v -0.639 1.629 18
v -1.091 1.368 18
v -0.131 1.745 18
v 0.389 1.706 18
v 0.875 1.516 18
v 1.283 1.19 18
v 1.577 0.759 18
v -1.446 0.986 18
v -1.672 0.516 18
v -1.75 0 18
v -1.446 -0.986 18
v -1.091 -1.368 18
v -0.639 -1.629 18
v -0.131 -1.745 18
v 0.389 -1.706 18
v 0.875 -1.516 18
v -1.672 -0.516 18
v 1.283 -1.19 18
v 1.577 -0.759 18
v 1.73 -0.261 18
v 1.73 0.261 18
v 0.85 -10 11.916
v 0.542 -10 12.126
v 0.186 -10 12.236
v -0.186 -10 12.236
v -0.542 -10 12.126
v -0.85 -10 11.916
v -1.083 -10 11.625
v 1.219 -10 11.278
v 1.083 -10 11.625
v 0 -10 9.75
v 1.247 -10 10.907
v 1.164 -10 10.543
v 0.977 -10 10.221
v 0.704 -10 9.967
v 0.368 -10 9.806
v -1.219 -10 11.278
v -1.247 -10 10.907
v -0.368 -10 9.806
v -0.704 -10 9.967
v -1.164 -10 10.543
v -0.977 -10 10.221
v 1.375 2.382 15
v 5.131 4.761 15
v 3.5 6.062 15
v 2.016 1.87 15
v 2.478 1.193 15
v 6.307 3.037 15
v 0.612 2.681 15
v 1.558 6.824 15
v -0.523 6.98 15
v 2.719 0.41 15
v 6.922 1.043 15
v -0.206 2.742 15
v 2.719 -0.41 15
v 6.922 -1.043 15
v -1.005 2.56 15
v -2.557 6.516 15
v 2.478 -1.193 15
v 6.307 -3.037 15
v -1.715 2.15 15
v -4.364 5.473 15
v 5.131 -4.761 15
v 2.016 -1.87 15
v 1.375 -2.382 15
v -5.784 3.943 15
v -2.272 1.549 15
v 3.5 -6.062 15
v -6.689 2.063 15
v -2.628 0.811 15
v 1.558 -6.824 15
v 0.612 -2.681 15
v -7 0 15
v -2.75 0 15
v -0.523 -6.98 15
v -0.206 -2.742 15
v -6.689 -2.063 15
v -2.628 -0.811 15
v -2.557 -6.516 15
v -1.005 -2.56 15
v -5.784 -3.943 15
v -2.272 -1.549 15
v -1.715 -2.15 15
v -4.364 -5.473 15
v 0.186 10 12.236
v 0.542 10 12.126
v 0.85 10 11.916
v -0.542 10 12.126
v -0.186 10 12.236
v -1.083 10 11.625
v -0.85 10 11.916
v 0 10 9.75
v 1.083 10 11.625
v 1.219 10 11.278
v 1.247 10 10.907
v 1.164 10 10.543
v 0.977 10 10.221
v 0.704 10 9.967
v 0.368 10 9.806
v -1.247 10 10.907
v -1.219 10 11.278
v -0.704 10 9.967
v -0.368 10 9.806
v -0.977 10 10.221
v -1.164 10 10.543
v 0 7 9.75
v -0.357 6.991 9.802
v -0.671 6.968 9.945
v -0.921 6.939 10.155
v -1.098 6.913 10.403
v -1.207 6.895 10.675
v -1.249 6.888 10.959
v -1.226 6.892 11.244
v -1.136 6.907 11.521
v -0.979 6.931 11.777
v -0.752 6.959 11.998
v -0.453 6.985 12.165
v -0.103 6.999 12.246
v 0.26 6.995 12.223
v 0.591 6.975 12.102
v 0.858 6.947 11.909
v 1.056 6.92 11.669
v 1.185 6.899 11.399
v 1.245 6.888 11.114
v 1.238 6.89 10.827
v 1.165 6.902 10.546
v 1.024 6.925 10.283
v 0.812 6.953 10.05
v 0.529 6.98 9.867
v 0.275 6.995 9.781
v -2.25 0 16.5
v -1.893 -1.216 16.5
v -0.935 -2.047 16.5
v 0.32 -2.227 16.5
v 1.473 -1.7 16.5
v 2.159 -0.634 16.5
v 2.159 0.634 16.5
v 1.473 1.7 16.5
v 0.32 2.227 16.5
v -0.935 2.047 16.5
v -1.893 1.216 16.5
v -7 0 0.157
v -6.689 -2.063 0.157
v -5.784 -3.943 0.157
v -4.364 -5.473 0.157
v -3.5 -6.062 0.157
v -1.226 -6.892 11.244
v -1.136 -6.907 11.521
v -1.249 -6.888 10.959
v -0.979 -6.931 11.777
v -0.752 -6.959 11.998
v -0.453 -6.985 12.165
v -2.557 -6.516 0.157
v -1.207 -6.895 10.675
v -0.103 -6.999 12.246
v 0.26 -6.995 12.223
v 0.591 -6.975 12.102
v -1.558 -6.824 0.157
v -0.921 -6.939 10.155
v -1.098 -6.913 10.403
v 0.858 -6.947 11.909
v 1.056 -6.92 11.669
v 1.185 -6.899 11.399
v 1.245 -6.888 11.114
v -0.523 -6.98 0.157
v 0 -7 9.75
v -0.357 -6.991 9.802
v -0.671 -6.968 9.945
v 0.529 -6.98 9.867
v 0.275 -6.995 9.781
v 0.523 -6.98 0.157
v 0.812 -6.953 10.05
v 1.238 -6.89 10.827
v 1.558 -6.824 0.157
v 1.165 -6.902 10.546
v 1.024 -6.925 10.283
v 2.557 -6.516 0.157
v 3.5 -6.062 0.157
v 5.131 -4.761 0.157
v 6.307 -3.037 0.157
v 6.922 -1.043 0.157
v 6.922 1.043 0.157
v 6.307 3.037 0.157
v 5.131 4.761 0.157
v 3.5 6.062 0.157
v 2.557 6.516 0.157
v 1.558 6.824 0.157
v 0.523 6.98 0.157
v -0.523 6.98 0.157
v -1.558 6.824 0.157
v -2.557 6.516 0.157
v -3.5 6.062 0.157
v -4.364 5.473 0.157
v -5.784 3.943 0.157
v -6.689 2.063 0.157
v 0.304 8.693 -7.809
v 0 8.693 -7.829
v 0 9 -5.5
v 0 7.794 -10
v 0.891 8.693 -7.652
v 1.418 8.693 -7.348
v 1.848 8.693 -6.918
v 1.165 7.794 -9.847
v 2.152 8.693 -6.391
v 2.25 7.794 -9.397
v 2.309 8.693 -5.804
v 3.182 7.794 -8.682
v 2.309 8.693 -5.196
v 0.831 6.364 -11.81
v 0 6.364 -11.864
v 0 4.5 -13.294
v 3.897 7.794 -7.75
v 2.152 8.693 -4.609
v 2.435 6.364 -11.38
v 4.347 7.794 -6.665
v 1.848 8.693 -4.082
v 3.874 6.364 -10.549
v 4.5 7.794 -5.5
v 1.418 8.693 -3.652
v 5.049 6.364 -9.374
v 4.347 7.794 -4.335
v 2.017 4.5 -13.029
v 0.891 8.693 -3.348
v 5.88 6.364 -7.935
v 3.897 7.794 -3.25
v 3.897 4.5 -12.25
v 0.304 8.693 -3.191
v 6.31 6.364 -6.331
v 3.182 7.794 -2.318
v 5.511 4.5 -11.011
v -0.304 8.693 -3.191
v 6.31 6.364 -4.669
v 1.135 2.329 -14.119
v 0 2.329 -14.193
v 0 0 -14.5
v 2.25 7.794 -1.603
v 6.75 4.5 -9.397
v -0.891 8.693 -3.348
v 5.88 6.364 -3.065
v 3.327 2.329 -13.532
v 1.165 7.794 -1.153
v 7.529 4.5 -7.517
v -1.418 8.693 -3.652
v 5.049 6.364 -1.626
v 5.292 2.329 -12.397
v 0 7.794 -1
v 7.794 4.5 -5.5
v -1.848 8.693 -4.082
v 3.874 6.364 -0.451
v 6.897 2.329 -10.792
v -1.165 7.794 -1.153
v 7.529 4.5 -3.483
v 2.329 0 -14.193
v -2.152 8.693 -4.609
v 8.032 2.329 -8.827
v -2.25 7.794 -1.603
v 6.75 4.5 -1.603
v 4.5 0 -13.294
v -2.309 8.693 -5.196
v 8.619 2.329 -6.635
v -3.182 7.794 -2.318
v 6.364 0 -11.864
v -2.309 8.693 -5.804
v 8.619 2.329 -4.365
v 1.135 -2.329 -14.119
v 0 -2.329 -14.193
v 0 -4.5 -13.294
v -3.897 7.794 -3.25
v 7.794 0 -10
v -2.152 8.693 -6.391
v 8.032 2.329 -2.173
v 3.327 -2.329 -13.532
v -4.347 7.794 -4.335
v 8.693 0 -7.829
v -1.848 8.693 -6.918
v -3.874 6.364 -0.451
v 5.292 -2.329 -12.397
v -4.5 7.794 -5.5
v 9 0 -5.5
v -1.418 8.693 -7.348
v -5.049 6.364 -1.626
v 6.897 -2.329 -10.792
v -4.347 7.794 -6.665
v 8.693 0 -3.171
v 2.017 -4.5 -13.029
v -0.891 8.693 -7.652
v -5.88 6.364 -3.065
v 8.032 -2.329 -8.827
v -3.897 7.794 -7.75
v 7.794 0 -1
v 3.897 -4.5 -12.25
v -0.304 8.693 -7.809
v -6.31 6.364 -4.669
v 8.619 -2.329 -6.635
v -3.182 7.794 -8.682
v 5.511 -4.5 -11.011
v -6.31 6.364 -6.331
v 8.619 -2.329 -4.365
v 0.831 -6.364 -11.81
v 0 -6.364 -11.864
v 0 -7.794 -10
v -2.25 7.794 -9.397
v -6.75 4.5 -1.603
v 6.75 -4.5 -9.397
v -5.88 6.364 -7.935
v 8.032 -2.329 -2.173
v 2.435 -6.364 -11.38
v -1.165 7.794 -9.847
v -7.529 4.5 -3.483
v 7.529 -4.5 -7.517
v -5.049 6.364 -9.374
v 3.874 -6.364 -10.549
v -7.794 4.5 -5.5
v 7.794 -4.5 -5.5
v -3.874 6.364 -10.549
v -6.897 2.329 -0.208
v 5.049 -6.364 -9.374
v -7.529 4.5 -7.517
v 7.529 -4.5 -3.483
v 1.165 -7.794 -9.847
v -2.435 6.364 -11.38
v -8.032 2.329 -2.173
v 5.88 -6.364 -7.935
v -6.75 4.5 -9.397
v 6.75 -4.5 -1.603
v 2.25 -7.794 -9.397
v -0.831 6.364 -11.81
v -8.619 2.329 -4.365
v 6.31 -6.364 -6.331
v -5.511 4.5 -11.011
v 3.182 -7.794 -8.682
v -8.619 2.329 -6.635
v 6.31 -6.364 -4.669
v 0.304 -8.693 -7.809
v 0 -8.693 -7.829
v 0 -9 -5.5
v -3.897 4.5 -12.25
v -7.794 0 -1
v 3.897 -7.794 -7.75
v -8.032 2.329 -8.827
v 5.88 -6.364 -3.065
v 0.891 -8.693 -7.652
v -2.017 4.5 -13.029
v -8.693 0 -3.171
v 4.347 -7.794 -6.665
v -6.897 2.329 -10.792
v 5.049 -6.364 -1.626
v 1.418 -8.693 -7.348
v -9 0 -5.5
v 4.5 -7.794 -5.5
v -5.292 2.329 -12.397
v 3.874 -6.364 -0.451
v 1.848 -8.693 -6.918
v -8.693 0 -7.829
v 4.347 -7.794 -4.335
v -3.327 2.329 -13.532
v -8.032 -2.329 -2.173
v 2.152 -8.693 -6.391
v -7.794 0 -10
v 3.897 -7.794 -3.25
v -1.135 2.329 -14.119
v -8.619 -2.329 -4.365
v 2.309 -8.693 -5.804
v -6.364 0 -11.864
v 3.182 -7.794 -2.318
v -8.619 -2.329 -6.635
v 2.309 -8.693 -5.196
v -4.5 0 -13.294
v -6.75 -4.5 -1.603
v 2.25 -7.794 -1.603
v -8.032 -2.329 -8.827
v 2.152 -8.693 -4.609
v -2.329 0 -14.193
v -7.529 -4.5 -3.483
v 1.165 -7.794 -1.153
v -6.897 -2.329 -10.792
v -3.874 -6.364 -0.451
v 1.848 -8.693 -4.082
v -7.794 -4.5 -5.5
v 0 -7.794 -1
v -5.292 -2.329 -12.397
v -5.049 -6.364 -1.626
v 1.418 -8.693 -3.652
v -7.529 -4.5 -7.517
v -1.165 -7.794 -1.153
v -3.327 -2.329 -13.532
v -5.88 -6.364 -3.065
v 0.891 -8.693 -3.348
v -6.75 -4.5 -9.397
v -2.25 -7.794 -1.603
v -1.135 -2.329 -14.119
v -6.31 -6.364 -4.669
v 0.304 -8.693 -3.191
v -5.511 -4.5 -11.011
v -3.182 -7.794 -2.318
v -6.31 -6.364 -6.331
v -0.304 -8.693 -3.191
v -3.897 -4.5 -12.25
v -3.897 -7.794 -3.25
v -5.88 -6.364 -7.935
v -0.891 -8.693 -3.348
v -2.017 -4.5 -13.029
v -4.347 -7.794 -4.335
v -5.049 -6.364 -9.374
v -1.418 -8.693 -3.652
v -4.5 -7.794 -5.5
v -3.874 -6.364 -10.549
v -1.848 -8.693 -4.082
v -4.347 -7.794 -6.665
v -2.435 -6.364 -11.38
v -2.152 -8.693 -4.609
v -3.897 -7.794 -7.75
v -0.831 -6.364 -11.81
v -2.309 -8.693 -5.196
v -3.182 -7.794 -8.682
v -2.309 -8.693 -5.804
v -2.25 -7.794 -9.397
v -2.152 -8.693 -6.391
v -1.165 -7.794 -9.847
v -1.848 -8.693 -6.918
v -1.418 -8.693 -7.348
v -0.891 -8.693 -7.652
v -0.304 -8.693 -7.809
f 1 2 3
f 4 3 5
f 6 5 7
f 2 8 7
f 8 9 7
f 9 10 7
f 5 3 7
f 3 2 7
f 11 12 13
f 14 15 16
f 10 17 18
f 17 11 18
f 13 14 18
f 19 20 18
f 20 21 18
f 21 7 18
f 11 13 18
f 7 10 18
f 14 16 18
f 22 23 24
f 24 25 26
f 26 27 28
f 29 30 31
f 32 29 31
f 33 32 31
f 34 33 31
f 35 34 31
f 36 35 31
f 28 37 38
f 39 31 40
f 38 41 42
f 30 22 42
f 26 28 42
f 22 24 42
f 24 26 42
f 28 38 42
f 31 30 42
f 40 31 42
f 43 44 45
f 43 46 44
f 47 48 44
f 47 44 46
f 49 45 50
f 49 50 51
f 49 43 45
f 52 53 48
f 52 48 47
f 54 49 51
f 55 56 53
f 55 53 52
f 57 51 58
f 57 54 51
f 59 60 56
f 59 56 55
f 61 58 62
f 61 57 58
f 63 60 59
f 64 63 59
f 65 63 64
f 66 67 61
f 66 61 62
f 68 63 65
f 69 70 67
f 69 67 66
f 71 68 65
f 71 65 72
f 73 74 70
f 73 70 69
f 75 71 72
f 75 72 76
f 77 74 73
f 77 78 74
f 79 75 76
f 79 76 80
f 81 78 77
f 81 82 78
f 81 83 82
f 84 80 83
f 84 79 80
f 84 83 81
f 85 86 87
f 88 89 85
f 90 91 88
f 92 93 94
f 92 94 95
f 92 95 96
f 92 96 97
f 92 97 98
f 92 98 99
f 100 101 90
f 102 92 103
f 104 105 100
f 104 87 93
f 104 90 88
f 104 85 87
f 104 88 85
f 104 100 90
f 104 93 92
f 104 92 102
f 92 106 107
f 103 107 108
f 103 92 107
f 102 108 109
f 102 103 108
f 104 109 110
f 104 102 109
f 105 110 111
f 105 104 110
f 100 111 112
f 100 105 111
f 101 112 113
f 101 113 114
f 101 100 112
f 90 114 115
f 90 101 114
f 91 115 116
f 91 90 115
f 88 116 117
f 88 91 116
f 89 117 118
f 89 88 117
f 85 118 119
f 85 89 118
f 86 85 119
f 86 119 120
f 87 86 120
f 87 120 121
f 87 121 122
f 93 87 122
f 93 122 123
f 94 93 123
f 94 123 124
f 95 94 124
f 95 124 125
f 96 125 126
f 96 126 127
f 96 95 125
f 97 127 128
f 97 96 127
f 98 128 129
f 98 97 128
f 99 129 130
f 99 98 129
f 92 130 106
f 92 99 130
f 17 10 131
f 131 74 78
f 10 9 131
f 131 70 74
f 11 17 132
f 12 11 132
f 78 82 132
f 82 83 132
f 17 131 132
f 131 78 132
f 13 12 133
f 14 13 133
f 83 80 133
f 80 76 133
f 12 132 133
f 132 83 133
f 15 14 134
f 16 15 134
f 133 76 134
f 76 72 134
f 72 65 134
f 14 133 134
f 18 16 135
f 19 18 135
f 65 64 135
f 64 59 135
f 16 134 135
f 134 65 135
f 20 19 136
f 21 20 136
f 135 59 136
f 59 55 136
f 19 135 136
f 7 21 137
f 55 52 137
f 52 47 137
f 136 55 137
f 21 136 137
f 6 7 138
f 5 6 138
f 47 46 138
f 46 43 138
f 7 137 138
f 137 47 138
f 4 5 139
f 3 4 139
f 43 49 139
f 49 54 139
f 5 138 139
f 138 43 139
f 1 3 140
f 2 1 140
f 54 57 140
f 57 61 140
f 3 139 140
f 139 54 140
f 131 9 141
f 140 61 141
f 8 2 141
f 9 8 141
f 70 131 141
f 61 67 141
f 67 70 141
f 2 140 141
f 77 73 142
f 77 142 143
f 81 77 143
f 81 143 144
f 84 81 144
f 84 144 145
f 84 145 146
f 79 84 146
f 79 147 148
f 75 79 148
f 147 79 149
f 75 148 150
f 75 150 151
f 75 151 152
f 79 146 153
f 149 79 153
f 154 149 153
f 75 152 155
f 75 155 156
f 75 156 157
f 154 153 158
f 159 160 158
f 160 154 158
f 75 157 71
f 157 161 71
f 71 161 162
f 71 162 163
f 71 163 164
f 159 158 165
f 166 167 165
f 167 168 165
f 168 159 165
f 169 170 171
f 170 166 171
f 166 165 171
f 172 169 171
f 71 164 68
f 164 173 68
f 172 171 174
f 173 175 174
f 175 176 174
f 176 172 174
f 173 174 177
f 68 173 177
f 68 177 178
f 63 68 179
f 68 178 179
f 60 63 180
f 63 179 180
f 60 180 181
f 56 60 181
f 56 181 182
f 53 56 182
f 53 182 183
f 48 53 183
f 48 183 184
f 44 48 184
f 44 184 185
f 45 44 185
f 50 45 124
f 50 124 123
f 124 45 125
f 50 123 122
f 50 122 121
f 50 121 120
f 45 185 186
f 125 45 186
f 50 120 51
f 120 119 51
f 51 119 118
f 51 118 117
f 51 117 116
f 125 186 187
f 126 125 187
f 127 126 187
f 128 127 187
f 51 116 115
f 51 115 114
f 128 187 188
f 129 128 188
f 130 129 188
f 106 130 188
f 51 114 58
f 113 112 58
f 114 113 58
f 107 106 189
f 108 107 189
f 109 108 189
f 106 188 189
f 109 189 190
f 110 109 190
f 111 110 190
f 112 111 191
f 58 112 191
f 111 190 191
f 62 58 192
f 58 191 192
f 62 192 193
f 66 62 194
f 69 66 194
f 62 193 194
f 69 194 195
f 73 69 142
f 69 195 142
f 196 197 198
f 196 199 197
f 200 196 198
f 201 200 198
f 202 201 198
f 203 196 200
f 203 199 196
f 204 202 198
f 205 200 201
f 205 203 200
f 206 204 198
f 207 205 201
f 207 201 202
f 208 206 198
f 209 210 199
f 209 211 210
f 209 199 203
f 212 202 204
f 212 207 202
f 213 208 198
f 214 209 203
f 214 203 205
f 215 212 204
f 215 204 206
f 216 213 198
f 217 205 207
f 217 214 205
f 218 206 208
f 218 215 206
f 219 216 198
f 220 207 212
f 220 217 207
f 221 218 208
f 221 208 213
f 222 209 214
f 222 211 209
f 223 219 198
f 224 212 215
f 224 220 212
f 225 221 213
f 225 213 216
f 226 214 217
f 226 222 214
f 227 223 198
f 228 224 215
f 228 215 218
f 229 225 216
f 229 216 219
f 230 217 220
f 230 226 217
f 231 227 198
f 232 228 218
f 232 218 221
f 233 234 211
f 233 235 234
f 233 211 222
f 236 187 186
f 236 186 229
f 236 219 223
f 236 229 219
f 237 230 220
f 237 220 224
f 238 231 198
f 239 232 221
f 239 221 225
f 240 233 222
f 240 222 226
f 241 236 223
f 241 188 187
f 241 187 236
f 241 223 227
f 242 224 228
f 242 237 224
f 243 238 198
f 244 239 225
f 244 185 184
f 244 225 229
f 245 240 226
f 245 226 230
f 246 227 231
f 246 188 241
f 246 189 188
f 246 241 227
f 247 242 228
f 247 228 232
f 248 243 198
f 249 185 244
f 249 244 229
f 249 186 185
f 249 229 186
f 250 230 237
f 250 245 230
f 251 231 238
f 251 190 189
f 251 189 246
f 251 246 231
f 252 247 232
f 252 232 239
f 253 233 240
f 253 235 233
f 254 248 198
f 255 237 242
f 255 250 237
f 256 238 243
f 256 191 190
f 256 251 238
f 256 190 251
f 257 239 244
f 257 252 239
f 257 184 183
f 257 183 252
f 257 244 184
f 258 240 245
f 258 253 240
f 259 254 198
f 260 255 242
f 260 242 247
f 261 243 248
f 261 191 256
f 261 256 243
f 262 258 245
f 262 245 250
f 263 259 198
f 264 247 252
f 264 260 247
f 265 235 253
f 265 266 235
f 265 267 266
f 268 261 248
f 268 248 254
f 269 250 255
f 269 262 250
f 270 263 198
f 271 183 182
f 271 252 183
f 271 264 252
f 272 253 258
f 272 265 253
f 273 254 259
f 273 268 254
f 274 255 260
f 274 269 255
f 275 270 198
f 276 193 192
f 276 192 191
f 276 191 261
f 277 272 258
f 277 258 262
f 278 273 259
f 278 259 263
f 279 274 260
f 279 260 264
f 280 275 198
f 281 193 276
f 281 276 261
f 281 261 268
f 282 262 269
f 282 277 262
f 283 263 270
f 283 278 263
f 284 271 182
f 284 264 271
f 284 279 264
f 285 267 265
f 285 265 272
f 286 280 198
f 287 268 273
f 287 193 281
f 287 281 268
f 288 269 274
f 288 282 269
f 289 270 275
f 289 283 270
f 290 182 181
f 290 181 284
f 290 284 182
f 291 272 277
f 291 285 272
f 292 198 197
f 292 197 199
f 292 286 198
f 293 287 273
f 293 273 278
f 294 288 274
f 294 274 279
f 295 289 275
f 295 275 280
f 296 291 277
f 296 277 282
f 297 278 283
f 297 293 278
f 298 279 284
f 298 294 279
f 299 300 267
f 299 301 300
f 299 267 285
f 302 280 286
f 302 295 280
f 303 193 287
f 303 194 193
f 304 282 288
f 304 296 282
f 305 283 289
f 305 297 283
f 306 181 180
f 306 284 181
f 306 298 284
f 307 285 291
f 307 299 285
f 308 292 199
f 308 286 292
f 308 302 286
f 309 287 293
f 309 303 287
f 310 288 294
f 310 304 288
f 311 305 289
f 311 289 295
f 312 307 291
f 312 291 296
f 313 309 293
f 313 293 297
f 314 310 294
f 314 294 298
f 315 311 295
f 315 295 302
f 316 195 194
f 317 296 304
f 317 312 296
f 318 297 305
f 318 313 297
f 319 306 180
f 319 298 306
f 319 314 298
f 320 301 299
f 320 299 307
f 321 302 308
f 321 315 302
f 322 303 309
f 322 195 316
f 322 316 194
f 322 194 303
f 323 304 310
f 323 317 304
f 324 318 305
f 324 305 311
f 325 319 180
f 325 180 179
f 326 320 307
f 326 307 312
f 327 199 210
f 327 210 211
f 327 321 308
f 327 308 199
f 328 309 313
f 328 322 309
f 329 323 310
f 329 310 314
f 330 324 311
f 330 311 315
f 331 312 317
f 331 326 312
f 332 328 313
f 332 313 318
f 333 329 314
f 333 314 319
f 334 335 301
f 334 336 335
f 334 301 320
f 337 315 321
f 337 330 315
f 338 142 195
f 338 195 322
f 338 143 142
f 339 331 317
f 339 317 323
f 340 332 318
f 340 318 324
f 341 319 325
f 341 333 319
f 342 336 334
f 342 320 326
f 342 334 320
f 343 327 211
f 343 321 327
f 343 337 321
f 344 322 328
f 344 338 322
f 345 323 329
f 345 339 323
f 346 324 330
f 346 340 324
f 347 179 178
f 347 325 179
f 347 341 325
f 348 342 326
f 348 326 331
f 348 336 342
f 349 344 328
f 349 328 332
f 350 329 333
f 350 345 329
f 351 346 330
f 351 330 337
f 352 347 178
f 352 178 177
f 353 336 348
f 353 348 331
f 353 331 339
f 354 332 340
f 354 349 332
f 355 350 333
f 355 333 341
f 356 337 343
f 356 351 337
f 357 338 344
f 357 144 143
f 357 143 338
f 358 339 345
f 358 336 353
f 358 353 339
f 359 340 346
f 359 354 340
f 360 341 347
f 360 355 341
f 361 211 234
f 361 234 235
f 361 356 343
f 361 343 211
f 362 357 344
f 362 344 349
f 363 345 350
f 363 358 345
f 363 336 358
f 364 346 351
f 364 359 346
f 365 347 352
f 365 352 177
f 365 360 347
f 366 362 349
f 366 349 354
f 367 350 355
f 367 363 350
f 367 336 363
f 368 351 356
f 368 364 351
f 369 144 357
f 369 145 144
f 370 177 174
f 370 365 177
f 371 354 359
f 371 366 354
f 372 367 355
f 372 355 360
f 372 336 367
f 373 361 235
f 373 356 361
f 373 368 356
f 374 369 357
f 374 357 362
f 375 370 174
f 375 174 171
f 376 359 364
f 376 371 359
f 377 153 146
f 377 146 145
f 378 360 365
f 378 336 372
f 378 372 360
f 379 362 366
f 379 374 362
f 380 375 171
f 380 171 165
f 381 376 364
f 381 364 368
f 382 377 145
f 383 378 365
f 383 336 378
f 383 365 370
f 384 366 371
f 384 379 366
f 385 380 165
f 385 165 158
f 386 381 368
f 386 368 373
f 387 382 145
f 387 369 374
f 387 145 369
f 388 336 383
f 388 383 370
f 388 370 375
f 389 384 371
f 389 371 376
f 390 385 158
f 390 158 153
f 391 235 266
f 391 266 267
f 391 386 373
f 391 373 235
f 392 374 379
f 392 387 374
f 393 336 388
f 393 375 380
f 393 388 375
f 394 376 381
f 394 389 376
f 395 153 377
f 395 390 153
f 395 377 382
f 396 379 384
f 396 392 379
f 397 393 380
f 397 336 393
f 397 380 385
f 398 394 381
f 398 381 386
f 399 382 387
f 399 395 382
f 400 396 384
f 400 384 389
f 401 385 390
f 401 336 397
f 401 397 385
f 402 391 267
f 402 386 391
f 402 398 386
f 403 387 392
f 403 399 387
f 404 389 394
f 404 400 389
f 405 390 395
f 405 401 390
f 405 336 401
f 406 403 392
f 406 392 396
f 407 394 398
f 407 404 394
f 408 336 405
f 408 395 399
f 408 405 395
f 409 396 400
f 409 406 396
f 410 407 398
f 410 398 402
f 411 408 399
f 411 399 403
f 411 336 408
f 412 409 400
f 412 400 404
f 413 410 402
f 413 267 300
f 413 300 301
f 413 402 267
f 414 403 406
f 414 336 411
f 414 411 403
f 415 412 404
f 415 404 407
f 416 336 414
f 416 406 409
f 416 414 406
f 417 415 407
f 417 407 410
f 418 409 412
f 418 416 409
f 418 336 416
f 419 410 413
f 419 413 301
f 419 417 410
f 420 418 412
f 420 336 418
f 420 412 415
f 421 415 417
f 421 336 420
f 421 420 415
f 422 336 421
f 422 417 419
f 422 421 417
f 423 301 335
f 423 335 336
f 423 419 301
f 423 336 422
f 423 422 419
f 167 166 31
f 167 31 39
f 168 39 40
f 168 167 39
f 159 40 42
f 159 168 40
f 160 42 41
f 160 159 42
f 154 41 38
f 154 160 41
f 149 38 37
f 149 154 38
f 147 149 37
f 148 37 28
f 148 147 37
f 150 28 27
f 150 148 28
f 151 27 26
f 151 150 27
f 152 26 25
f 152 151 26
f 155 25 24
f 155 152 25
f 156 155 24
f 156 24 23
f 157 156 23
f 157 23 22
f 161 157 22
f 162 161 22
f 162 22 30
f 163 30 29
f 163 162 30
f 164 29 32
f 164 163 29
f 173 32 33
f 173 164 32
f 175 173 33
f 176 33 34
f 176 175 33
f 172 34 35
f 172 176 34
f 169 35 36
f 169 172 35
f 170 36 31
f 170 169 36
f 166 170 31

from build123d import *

# Parameters (mm, degrees)
ESQUISSE1_R        = 7
CORPS_DEPTH        = 15
ESQUISSE4_R        = 1.25
BAILLONETTES_DEPTH = 10


with BuildPart() as part:
    # Esquisse1 → Corps (new body)
    with BuildSketch(Plane.XY):
        with Locations(Location((0, 0, 0), (0, 0, 180))):  # turned: the seam where the file's is
            Circle(ESQUISSE1_R)
    extrude(amount=CORPS_DEPTH)

    # Esquisse3 → Verre (revolve)
    with BuildSketch(Plane(origin=(0, 0, 0), x_dir=(0, 0, -1), z_dir=(1, 0, 0))):
        with BuildLine():
            Line((5.5, -9), (5.5, 9))
            ThreePointArc((5.5, 9), (14.5, 0), (5.5, -9))
        make_face()
    revolve(axis=Axis((0, 11.000458592, -5.5), (0, -1, 0)))

    # Esquisse4 → Baillonettes (add, symmetric)
    with BuildSketch(Plane(origin=(0, 0, 0), x_dir=(1, 0, 0), z_dir=(0, 1, 0))):
        with Locations(Location((0, -11, 0), (0, 0, 90))):  # turned: the seam where the file's is
            Circle(ESQUISSE4_R)
    extrude(amount=BAILLONETTES_DEPTH, both=True)

    # Esquisse5 → Culot (revolve)
    with BuildSketch(Plane(origin=(0, 0, 0), x_dir=(0, 0, -1), z_dir=(1, 0, 0)), mode=Mode.PRIVATE) as culot_sk:
        Polygon((-18, 0), (-18, 1.75), (-15, 2.75), (-15, 0), align=None)
    revolve(culot_sk.sketch.rotate(Axis((0, 0, 9.557270233), (0, 0, 1)), 90), axis=Axis((0, 0, 9.557270233), (0, 0, 1)))  # turned: the seam where the file's is


solid = part.part
